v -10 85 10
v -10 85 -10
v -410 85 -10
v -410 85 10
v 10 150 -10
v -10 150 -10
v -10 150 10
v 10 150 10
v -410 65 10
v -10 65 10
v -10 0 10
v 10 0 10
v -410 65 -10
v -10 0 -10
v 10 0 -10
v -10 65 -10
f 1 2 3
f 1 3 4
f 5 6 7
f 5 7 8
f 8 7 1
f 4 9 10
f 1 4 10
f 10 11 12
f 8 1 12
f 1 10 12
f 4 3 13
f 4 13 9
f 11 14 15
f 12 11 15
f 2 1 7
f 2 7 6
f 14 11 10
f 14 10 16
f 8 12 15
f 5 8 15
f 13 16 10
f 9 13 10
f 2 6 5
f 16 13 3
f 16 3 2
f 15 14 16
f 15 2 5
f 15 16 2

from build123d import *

# Parameters (mm, degrees)
SKETCH1_W           = 20
SKETCH1_H           = 20
BOSS_EXTRUDE1_DEPTH = 150
SKETCH2_W           = 20
SKETCH2_H           = 20
BOSS_EXTRUDE2_DEPTH = 400


with BuildPart() as part:
    # Sketch1 → Boss-Extrude1 (new body)
    with BuildSketch(Plane(origin=(0, 0, 0), x_dir=(1, 0, 0), z_dir=(0, 1, 0))):
        Rectangle(SKETCH1_W, SKETCH1_H)
    extrude(amount=BOSS_EXTRUDE1_DEPTH)

    # Sketch2 → Boss-Extrude2 (add)
    with BuildSketch(Plane.ZY.offset(10)):
        with Locations((0, 75)):
            Rectangle(SKETCH2_W, SKETCH2_H)
    extrude(amount=BOSS_EXTRUDE2_DEPTH)


solid = part.part
